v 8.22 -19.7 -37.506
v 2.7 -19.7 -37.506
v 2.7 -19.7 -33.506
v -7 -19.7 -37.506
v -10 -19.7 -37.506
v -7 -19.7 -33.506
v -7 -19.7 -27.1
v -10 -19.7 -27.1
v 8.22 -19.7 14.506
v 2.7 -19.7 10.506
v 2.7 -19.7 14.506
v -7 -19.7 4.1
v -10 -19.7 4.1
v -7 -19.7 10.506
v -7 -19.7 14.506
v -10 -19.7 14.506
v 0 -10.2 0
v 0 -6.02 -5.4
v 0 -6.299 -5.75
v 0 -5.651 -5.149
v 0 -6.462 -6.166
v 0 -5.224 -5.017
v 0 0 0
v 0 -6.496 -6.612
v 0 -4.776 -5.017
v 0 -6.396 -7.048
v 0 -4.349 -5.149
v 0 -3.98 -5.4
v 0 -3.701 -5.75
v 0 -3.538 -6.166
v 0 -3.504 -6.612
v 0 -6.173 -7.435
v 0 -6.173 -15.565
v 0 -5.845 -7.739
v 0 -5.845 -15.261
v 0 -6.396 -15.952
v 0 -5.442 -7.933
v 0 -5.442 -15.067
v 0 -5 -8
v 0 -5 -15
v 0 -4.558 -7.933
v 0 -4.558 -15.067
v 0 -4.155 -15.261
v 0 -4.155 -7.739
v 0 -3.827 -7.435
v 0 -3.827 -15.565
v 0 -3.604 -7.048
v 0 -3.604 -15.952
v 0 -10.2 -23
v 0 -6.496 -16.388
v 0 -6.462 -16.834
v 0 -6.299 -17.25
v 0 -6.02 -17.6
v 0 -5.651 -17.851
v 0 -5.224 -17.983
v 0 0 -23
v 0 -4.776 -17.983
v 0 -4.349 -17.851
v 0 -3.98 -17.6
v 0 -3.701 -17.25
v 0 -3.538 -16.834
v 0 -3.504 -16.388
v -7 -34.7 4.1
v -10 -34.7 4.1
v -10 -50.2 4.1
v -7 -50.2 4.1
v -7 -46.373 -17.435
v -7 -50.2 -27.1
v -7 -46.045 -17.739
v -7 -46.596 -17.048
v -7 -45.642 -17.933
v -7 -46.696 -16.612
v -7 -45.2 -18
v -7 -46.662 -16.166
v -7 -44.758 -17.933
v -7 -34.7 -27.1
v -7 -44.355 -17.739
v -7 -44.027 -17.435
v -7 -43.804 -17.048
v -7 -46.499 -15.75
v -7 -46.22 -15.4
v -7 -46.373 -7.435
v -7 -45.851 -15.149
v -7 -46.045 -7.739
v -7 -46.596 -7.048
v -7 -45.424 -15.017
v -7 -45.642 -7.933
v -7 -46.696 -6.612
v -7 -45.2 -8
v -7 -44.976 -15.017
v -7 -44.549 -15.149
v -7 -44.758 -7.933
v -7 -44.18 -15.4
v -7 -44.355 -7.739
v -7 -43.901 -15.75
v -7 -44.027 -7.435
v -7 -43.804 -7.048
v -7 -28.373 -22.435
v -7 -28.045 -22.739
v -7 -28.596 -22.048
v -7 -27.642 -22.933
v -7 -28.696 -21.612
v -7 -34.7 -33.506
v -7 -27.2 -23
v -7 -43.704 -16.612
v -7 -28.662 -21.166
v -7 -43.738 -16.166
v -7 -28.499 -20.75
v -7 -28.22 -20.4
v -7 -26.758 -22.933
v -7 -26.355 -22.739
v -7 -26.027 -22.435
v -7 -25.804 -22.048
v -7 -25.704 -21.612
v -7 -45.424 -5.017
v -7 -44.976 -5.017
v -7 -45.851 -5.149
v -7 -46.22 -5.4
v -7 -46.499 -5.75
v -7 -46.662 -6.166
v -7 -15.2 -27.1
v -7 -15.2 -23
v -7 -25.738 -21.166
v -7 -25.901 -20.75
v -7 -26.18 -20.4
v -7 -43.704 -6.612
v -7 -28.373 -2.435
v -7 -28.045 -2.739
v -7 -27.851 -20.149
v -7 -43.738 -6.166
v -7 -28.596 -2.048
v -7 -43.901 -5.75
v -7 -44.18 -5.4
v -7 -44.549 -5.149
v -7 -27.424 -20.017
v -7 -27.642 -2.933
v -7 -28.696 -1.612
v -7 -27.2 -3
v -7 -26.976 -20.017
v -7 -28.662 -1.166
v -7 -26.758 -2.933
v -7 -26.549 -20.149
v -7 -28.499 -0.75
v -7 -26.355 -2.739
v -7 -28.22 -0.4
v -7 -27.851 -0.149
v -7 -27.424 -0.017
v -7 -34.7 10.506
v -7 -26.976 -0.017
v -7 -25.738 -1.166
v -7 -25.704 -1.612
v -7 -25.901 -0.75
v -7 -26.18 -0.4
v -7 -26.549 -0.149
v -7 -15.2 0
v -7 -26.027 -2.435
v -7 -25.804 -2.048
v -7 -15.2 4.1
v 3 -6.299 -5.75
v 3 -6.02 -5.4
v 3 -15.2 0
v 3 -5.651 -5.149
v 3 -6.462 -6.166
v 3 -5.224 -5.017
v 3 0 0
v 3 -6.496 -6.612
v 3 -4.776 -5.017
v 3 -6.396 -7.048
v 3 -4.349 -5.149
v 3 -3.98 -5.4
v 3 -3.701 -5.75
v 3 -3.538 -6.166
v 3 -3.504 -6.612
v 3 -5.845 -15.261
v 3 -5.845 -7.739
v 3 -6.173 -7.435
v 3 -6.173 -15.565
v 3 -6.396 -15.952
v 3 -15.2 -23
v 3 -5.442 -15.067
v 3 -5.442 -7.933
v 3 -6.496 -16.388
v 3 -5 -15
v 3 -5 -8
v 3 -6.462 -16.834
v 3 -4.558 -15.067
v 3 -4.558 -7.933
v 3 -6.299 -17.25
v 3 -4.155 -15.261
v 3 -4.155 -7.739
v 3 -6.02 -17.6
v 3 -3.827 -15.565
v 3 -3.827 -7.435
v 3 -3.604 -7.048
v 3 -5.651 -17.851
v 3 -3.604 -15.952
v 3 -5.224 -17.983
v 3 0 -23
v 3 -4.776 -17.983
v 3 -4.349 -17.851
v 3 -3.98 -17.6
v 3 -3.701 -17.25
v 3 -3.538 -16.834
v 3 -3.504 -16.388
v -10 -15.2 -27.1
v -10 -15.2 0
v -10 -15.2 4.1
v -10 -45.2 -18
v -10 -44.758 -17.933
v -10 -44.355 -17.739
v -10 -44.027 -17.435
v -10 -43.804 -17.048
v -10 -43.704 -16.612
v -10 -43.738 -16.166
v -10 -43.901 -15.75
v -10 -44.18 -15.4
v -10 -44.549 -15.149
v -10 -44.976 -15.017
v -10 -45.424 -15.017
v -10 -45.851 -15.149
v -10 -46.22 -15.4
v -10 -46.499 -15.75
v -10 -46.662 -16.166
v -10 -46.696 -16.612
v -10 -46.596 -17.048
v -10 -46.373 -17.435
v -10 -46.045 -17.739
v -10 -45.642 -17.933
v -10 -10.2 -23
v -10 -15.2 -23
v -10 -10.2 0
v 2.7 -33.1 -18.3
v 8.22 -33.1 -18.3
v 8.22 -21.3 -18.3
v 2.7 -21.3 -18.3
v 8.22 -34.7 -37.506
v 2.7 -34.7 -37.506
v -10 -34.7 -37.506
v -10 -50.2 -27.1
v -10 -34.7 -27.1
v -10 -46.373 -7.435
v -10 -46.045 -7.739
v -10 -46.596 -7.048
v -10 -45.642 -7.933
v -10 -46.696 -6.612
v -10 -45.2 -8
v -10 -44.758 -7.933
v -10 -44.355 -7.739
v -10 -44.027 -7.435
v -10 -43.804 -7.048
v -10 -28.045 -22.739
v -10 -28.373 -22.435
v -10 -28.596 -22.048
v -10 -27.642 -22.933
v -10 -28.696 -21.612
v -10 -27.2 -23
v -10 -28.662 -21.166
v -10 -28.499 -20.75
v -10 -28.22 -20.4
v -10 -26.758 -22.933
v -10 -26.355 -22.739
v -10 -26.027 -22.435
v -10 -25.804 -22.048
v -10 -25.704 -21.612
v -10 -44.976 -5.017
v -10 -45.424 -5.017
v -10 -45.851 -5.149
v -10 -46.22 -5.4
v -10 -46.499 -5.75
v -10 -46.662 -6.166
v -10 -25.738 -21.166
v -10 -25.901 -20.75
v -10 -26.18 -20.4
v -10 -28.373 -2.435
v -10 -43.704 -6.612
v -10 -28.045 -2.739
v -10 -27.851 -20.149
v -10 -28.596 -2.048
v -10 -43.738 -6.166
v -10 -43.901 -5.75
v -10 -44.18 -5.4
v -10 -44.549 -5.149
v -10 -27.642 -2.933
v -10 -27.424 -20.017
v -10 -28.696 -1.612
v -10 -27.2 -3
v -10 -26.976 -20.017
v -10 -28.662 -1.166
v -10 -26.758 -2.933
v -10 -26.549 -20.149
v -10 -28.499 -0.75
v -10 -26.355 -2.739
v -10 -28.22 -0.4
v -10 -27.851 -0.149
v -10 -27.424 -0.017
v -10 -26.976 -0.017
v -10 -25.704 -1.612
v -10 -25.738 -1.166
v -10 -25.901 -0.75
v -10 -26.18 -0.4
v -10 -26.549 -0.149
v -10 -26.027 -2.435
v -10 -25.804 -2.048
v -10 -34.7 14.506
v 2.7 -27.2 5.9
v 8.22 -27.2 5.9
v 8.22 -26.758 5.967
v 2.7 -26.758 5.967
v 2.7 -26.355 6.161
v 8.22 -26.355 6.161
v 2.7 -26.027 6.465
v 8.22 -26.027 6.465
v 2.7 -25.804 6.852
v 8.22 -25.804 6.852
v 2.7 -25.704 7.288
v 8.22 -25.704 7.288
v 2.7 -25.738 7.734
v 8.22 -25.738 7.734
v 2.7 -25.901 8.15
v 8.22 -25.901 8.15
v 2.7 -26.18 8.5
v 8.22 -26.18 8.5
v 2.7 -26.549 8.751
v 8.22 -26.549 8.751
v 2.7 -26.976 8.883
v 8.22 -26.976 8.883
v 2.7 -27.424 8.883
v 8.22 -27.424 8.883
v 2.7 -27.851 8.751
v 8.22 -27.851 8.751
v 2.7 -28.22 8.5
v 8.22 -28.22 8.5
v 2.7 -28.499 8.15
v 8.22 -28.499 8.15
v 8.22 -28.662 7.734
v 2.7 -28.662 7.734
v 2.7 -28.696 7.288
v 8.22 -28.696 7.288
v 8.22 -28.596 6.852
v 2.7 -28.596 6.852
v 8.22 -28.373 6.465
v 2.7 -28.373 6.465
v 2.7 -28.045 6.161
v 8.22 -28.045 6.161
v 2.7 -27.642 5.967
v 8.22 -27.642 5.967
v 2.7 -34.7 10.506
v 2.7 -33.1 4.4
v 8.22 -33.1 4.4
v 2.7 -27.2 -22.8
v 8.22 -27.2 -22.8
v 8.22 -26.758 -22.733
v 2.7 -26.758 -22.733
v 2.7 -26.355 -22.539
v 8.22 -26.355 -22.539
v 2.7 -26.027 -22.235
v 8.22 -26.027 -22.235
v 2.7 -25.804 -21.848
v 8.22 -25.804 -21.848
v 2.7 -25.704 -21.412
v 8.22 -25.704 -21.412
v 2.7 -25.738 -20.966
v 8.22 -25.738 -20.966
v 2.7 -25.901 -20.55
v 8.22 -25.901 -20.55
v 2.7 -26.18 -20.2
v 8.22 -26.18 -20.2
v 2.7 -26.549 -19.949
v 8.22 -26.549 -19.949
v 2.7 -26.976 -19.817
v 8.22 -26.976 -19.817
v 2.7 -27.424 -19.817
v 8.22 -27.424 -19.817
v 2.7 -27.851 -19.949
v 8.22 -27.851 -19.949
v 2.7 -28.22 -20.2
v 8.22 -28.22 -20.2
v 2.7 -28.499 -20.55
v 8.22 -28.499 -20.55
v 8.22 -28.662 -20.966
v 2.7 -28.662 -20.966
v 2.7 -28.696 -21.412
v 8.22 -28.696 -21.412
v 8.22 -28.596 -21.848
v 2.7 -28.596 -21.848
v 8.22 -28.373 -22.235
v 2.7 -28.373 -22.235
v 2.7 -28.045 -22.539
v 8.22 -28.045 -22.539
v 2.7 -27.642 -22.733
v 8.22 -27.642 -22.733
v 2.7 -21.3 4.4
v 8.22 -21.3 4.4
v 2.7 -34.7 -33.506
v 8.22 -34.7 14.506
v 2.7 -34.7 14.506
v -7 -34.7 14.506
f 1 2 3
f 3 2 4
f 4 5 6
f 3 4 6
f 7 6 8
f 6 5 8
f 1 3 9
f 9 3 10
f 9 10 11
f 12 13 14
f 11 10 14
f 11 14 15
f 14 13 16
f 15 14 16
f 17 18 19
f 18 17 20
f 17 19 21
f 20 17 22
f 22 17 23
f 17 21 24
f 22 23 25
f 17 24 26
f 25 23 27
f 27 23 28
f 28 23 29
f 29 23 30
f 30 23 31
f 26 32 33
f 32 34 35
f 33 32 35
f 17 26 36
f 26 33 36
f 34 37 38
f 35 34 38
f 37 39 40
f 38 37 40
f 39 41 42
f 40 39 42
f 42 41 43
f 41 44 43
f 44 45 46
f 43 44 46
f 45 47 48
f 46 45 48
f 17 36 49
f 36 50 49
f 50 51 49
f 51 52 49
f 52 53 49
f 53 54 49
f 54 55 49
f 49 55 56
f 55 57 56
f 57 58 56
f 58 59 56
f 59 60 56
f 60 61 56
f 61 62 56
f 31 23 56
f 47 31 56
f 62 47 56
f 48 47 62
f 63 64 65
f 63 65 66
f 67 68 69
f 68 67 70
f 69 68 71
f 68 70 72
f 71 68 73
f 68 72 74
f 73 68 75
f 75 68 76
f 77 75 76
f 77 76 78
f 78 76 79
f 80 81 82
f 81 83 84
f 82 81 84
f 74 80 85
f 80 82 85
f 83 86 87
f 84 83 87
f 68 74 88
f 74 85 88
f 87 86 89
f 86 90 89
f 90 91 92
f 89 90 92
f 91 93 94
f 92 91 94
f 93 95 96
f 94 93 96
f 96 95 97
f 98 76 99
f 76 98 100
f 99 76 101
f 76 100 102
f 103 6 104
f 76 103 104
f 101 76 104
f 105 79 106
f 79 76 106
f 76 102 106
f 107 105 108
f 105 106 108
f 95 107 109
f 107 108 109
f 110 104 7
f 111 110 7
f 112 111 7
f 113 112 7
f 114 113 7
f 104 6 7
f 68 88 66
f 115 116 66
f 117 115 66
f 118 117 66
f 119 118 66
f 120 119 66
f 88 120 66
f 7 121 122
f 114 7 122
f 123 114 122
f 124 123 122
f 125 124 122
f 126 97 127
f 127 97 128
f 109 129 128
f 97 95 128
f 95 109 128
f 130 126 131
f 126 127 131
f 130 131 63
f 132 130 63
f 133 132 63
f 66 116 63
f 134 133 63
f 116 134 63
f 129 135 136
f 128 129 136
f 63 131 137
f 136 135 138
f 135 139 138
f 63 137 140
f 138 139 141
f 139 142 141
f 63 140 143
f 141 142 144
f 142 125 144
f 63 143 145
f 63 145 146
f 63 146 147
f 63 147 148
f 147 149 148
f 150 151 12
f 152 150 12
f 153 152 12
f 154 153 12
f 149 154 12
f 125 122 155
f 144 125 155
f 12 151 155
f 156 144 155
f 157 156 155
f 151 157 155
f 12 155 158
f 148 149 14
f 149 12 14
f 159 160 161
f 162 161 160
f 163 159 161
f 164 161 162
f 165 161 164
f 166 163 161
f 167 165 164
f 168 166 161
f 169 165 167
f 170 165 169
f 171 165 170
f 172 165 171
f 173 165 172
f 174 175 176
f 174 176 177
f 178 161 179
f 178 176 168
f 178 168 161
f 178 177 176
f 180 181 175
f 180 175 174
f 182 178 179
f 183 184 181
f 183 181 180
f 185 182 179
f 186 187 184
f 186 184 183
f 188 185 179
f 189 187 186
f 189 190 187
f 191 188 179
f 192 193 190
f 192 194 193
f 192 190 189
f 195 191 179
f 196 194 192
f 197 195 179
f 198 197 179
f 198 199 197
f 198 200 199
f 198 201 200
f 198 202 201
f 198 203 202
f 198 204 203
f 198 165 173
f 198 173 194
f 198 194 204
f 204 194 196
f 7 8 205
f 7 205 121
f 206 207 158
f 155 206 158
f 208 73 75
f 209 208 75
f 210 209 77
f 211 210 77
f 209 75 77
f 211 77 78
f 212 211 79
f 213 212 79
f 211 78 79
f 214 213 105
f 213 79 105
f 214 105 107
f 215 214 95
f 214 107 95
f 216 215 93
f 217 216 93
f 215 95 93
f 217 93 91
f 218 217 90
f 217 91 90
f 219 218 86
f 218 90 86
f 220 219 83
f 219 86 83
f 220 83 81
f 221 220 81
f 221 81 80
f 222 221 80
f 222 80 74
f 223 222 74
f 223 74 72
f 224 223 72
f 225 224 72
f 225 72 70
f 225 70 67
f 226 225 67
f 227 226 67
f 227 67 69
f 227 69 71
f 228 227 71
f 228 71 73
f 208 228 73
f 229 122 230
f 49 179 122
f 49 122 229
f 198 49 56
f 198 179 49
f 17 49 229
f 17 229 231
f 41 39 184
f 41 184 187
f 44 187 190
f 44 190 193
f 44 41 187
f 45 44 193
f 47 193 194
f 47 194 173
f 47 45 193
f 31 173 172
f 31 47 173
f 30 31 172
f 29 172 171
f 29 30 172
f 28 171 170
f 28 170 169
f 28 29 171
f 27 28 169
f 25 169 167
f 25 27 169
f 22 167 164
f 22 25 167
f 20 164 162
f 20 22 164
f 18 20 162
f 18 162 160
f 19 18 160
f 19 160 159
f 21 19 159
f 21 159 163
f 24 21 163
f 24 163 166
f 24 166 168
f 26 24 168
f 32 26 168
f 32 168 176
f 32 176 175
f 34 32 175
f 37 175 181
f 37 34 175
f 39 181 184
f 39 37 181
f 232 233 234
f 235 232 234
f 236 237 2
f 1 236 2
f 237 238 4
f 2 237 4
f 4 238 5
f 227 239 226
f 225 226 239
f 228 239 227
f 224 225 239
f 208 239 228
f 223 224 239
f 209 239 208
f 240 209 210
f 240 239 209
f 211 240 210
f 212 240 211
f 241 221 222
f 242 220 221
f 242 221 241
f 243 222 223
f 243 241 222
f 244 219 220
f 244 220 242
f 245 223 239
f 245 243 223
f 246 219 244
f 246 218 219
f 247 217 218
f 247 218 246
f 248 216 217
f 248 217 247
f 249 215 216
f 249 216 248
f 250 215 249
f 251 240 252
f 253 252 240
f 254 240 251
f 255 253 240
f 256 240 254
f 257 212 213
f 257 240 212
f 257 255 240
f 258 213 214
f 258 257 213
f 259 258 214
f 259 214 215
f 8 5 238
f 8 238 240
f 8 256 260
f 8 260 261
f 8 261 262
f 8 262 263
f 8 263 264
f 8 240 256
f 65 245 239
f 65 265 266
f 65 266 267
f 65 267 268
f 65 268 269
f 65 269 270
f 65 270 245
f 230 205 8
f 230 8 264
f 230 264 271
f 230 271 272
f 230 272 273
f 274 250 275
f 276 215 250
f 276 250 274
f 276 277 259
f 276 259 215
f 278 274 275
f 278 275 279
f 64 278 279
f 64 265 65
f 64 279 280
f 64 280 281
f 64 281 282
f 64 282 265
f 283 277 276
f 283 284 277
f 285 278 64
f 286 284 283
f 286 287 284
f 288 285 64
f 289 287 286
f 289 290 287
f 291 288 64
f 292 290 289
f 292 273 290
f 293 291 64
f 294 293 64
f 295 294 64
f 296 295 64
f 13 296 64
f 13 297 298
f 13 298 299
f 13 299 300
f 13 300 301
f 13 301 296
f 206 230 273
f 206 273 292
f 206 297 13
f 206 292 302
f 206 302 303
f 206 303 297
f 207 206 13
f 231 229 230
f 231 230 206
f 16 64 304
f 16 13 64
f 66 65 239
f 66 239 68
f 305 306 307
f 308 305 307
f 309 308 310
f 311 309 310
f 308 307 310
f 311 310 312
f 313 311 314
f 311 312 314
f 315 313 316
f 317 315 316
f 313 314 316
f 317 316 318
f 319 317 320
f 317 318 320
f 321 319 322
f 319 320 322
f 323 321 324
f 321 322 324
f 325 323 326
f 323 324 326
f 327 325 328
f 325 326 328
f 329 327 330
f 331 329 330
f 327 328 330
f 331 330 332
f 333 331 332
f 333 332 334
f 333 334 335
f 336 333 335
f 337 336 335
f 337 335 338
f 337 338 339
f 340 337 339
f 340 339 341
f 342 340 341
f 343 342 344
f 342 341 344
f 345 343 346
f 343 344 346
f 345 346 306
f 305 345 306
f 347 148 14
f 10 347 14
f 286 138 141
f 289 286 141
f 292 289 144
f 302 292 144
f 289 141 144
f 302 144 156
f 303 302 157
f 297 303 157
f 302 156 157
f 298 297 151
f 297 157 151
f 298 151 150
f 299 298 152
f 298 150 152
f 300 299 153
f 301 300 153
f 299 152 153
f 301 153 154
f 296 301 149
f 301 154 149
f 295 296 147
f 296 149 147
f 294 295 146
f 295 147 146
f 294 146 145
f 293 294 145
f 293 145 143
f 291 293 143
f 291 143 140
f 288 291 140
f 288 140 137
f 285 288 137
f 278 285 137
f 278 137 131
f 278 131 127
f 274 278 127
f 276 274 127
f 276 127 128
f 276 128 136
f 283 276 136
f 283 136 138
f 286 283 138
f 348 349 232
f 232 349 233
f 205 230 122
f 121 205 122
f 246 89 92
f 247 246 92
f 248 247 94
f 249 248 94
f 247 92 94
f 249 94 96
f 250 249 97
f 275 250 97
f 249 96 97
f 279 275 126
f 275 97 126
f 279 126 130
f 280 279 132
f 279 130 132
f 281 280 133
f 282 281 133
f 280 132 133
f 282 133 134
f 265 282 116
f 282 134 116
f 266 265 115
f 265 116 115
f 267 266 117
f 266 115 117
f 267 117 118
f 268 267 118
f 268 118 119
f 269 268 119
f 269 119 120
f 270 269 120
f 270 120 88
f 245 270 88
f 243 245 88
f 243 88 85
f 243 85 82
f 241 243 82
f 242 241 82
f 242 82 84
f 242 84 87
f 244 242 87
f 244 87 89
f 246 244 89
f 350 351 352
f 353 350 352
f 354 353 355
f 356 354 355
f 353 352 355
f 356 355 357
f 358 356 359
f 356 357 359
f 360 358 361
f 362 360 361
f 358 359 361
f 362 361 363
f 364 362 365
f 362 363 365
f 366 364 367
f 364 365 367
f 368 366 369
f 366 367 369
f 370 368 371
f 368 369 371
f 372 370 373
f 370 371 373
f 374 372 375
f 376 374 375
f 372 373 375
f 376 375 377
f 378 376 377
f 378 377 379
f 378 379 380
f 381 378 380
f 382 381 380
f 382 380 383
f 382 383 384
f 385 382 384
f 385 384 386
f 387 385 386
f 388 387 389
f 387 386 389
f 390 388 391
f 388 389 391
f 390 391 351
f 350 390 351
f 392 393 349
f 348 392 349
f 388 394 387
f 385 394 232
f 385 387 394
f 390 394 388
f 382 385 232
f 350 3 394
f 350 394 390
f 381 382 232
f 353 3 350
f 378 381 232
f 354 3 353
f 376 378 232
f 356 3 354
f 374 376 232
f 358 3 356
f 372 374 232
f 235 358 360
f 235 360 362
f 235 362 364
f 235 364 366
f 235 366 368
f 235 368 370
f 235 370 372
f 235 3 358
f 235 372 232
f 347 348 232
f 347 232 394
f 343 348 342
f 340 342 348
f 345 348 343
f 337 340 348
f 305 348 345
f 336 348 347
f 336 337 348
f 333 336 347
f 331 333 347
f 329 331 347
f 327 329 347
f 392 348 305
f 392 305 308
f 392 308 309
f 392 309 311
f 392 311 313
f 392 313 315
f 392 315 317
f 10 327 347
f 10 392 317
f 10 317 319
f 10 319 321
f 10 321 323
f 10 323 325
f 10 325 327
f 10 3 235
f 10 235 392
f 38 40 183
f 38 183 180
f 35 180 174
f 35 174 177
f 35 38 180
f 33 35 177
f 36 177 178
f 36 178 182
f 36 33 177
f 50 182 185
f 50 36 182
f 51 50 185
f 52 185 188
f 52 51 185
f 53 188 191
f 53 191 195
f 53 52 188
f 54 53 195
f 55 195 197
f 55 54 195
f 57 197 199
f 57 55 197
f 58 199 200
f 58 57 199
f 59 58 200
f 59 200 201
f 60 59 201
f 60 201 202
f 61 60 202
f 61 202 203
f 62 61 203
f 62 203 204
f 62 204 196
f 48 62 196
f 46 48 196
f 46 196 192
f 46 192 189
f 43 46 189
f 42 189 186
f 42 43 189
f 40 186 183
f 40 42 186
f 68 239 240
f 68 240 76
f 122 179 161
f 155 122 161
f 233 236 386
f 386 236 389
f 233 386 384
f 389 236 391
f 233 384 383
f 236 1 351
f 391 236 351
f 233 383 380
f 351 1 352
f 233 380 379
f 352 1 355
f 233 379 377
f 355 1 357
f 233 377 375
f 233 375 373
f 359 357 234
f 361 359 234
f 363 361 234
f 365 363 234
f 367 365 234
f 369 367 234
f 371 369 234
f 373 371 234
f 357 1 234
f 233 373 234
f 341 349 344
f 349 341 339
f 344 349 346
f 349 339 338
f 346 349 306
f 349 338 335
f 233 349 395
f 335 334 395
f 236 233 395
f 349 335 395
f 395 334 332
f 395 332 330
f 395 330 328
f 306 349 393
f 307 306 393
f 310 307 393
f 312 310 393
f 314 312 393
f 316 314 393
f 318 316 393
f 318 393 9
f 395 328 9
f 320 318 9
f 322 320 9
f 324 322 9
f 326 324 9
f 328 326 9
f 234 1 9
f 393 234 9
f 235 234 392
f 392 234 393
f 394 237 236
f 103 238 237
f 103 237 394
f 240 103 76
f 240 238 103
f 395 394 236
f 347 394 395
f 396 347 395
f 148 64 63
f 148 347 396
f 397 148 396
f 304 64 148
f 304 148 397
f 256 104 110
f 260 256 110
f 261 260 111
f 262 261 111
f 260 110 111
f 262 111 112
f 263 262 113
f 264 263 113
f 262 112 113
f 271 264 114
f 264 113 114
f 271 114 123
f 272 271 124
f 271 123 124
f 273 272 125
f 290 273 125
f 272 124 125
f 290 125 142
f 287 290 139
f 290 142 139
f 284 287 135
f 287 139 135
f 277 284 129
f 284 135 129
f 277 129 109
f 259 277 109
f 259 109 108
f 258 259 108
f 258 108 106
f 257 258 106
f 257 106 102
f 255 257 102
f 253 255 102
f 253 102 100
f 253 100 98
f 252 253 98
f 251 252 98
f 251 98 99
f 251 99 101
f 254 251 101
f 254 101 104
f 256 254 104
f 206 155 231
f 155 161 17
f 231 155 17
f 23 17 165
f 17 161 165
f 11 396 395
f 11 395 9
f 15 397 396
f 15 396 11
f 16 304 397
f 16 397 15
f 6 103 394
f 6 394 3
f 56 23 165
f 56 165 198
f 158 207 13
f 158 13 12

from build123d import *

# Parameters (mm, degrees)
ESQUISSE1_W             = 23
ESQUISSE1_H             = 15.2
ESQUISSE1_R             = 1.5
BOSS_EXTRU_1_DEPTH      = 3
ESQUISSE2_W             = 23
ESQUISSE2_H             = 5
BOSS_EXTRU_2_DEPTH      = 10
ESQUISSE4_W             = 3
ESQUISSE4_H             = 31.2
BOSS_EXTRU_3_DEPTH      = 35
CONG_1_R                = 10
ESQUISSE7_W             = 10.405823793
ESQUISSE7_H             = 15
BOSS_EXTRU_4_DEPTH      = 3
ESQUISSE8_W             = 4
ESQUISSE8_H             = 15
BOSS_EXTRU_5_DEPTH      = 9.7
ESQUISSE9_W             = 26.005823793
ESQUISSE9_H             = 15
BOSS_EXTRU_6_DEPTH      = 5.52
ESQUISSE10_R            = 1.5
ENL_V_MAT_EXTRU_2_DEPTH = 5.52
ESQUISSE5_R             = 1.5
ENL_V_MAT_EXTRU_3_DEPTH = 10


with BuildPart() as part:
    # Esquisse1 → Boss.-Extru.1 (new body)
    with BuildSketch(Plane(origin=(0, 0, 0), x_dir=(0, 0, -1), z_dir=(1, 0, 0))):
        with Locations((11.5, -7.6)):
            Rectangle(ESQUISSE1_W, ESQUISSE1_H)
        with Locations((6.5, -5)):
            Circle(ESQUISSE1_R, mode=Mode.SUBTRACT)
        with Locations(Location((16.5, -5, 0), (0, 0, 180))):
            Circle(ESQUISSE1_R, mode=Mode.SUBTRACT)
    extrude(amount=BOSS_EXTRU_1_DEPTH)

    # Esquisse2 → Boss.-Extru.2 (add)
    with BuildSketch(Plane.ZY):
        with Locations((-11.5, -12.7)):
            Rectangle(ESQUISSE2_W, ESQUISSE2_H)
    boss_extru_2 = extrude(amount=BOSS_EXTRU_2_DEPTH)

    # Esquisse4 → Boss.-Extru.3 (add)
    with BuildSketch(Plane.XZ.offset(15.2)):
        with Locations((-8.5, -11.5)):
            Rectangle(ESQUISSE4_W, ESQUISSE4_H)
    boss_extru_3 = extrude(amount=BOSS_EXTRU_3_DEPTH)

    # Congé1
    cong_1_edges = [part.edges().sort_by_distance(p)[0] for p in [
        (-8.5, -50.2, -27.1),
        (-8.5, -50.2, 4.1),
    ]]
    fillet(cong_1_edges, radius=CONG_1_R)

    # Esquisse7 → Boss.-Extru.4 (add, through all)
    with BuildSketch(Plane(origin=(-7, 0, 0), x_dir=(0, 0, -1), z_dir=(1, 0, 0))):
        with Locations((-9.302911897, -27.2)):
            Rectangle(ESQUISSE7_W, ESQUISSE7_H)
    boss_extru_4 = extrude(amount=-BOSS_EXTRU_4_DEPTH)

    # Esquisse8 → Boss.-Extru.5 (add)
    with BuildSketch(Plane(origin=(-7, 0, 0), x_dir=(0, 0, -1), z_dir=(1, 0, 0))):
        with Locations((-12.505823793, -27.2)):
            Rectangle(ESQUISSE8_W, ESQUISSE8_H)
    boss_extru_5 = extrude(amount=BOSS_EXTRU_5_DEPTH)

    # Esquisse9 → Boss.-Extru.6 (add)
    with BuildSketch(Plane(origin=(2.7, 0, 0), x_dir=(0, 0, -1), z_dir=(1, 0, 0))):
        with Locations((-1.502911897, -27.2)):
            Rectangle(ESQUISSE9_W, ESQUISSE9_H)
    boss_extru_6 = extrude(amount=BOSS_EXTRU_6_DEPTH)

    # Symétrie1: Boss.-Extru.2, Boss.-Extru.3, Boss.-Extru.4, Boss.-Extru.5, Boss.-Extru.6 across plane
    add(boss_extru_2.mirror(Plane(origin=(8.22, -19.7, -11.5), x_dir=(1, 0, 0), z_dir=(0, 0, 1))))
    add(boss_extru_3.mirror(Plane(origin=(8.22, -19.7, -11.5), x_dir=(1, 0, 0), z_dir=(0, 0, 1))))
    add(boss_extru_4.mirror(Plane(origin=(8.22, -19.7, -11.5), x_dir=(1, 0, 0), z_dir=(0, 0, 1))))
    add(boss_extru_5.mirror(Plane(origin=(8.22, -19.7, -11.5), x_dir=(1, 0, 0), z_dir=(0, 0, 1))))
    add(boss_extru_6.mirror(Plane(origin=(8.22, -19.7, -11.5), x_dir=(1, 0, 0), z_dir=(0, 0, 1))))

    # Esquisse10 → Enlèv. mat.-Extru.2 (cut)
    with BuildSketch(Plane(origin=(8.22, 0, 0), x_dir=(0, 0, -1), z_dir=(1, 0, 0))):
        with BuildLine():
            ThreePointArc((3, -27.2), (1.5, -25.7), (0, -27.2))
            Line((0, -27.2), (3, -27.2))
        make_face()
        with BuildLine():
            Line((3, -27.2), (0, -27.2))
            ThreePointArc((0, -27.2), (1.5, -28.7), (3, -27.2))
        make_face()
        with BuildLine():
            Line((-4.4, -21.3), (-4.4, -27.2))
            Line((-4.4, -27.2), (0, -27.2))
            ThreePointArc((0, -27.2), (1.5, -25.7), (3, -27.2))
            Line((3, -27.2), (18.3, -27.2))
            Line((18.3, -27.2), (18.3, -21.3))
            Line((18.3, -21.3), (-4.4, -21.3))
        make_face()
        with BuildLine():
            Line((0, -27.2), (-4.4, -27.2))
            Line((-4.4, -27.2), (-4.4, -33.1))
            Line((-4.4, -33.1), (18.3, -33.1))
            Line((18.3, -33.1), (18.3, -27.2))
            Line((18.3, -27.2), (3, -27.2))
            ThreePointArc((3, -27.2), (1.5, -28.7), (0, -27.2))
        make_face()
        with Locations((-7.4, -27.2)):
            Circle(ESQUISSE10_R)
        with Locations((21.3, -27.2)):
            Circle(ESQUISSE10_R)
    extrude(amount=-ENL_V_MAT_EXTRU_2_DEPTH, mode=Mode.SUBTRACT)

    # Esquisse5 → Enlèv. mat.-Extru.3 (cut)
    with BuildSketch(Plane(origin=(-7, 0, 0), x_dir=(0, 0, -1), z_dir=(1, 0, 0))):
        with Locations((6.5, -45.2)):
            Circle(ESQUISSE5_R)
        with Locations((1.5, -27.2)):
            Circle(ESQUISSE5_R)
        with Locations((16.5, -45.2)):
            Circle(ESQUISSE5_R)
        with Locations((21.5, -27.2)):
            Circle(ESQUISSE5_R)
    extrude(amount=-ENL_V_MAT_EXTRU_3_DEPTH, mode=Mode.SUBTRACT)


solid = part.part
